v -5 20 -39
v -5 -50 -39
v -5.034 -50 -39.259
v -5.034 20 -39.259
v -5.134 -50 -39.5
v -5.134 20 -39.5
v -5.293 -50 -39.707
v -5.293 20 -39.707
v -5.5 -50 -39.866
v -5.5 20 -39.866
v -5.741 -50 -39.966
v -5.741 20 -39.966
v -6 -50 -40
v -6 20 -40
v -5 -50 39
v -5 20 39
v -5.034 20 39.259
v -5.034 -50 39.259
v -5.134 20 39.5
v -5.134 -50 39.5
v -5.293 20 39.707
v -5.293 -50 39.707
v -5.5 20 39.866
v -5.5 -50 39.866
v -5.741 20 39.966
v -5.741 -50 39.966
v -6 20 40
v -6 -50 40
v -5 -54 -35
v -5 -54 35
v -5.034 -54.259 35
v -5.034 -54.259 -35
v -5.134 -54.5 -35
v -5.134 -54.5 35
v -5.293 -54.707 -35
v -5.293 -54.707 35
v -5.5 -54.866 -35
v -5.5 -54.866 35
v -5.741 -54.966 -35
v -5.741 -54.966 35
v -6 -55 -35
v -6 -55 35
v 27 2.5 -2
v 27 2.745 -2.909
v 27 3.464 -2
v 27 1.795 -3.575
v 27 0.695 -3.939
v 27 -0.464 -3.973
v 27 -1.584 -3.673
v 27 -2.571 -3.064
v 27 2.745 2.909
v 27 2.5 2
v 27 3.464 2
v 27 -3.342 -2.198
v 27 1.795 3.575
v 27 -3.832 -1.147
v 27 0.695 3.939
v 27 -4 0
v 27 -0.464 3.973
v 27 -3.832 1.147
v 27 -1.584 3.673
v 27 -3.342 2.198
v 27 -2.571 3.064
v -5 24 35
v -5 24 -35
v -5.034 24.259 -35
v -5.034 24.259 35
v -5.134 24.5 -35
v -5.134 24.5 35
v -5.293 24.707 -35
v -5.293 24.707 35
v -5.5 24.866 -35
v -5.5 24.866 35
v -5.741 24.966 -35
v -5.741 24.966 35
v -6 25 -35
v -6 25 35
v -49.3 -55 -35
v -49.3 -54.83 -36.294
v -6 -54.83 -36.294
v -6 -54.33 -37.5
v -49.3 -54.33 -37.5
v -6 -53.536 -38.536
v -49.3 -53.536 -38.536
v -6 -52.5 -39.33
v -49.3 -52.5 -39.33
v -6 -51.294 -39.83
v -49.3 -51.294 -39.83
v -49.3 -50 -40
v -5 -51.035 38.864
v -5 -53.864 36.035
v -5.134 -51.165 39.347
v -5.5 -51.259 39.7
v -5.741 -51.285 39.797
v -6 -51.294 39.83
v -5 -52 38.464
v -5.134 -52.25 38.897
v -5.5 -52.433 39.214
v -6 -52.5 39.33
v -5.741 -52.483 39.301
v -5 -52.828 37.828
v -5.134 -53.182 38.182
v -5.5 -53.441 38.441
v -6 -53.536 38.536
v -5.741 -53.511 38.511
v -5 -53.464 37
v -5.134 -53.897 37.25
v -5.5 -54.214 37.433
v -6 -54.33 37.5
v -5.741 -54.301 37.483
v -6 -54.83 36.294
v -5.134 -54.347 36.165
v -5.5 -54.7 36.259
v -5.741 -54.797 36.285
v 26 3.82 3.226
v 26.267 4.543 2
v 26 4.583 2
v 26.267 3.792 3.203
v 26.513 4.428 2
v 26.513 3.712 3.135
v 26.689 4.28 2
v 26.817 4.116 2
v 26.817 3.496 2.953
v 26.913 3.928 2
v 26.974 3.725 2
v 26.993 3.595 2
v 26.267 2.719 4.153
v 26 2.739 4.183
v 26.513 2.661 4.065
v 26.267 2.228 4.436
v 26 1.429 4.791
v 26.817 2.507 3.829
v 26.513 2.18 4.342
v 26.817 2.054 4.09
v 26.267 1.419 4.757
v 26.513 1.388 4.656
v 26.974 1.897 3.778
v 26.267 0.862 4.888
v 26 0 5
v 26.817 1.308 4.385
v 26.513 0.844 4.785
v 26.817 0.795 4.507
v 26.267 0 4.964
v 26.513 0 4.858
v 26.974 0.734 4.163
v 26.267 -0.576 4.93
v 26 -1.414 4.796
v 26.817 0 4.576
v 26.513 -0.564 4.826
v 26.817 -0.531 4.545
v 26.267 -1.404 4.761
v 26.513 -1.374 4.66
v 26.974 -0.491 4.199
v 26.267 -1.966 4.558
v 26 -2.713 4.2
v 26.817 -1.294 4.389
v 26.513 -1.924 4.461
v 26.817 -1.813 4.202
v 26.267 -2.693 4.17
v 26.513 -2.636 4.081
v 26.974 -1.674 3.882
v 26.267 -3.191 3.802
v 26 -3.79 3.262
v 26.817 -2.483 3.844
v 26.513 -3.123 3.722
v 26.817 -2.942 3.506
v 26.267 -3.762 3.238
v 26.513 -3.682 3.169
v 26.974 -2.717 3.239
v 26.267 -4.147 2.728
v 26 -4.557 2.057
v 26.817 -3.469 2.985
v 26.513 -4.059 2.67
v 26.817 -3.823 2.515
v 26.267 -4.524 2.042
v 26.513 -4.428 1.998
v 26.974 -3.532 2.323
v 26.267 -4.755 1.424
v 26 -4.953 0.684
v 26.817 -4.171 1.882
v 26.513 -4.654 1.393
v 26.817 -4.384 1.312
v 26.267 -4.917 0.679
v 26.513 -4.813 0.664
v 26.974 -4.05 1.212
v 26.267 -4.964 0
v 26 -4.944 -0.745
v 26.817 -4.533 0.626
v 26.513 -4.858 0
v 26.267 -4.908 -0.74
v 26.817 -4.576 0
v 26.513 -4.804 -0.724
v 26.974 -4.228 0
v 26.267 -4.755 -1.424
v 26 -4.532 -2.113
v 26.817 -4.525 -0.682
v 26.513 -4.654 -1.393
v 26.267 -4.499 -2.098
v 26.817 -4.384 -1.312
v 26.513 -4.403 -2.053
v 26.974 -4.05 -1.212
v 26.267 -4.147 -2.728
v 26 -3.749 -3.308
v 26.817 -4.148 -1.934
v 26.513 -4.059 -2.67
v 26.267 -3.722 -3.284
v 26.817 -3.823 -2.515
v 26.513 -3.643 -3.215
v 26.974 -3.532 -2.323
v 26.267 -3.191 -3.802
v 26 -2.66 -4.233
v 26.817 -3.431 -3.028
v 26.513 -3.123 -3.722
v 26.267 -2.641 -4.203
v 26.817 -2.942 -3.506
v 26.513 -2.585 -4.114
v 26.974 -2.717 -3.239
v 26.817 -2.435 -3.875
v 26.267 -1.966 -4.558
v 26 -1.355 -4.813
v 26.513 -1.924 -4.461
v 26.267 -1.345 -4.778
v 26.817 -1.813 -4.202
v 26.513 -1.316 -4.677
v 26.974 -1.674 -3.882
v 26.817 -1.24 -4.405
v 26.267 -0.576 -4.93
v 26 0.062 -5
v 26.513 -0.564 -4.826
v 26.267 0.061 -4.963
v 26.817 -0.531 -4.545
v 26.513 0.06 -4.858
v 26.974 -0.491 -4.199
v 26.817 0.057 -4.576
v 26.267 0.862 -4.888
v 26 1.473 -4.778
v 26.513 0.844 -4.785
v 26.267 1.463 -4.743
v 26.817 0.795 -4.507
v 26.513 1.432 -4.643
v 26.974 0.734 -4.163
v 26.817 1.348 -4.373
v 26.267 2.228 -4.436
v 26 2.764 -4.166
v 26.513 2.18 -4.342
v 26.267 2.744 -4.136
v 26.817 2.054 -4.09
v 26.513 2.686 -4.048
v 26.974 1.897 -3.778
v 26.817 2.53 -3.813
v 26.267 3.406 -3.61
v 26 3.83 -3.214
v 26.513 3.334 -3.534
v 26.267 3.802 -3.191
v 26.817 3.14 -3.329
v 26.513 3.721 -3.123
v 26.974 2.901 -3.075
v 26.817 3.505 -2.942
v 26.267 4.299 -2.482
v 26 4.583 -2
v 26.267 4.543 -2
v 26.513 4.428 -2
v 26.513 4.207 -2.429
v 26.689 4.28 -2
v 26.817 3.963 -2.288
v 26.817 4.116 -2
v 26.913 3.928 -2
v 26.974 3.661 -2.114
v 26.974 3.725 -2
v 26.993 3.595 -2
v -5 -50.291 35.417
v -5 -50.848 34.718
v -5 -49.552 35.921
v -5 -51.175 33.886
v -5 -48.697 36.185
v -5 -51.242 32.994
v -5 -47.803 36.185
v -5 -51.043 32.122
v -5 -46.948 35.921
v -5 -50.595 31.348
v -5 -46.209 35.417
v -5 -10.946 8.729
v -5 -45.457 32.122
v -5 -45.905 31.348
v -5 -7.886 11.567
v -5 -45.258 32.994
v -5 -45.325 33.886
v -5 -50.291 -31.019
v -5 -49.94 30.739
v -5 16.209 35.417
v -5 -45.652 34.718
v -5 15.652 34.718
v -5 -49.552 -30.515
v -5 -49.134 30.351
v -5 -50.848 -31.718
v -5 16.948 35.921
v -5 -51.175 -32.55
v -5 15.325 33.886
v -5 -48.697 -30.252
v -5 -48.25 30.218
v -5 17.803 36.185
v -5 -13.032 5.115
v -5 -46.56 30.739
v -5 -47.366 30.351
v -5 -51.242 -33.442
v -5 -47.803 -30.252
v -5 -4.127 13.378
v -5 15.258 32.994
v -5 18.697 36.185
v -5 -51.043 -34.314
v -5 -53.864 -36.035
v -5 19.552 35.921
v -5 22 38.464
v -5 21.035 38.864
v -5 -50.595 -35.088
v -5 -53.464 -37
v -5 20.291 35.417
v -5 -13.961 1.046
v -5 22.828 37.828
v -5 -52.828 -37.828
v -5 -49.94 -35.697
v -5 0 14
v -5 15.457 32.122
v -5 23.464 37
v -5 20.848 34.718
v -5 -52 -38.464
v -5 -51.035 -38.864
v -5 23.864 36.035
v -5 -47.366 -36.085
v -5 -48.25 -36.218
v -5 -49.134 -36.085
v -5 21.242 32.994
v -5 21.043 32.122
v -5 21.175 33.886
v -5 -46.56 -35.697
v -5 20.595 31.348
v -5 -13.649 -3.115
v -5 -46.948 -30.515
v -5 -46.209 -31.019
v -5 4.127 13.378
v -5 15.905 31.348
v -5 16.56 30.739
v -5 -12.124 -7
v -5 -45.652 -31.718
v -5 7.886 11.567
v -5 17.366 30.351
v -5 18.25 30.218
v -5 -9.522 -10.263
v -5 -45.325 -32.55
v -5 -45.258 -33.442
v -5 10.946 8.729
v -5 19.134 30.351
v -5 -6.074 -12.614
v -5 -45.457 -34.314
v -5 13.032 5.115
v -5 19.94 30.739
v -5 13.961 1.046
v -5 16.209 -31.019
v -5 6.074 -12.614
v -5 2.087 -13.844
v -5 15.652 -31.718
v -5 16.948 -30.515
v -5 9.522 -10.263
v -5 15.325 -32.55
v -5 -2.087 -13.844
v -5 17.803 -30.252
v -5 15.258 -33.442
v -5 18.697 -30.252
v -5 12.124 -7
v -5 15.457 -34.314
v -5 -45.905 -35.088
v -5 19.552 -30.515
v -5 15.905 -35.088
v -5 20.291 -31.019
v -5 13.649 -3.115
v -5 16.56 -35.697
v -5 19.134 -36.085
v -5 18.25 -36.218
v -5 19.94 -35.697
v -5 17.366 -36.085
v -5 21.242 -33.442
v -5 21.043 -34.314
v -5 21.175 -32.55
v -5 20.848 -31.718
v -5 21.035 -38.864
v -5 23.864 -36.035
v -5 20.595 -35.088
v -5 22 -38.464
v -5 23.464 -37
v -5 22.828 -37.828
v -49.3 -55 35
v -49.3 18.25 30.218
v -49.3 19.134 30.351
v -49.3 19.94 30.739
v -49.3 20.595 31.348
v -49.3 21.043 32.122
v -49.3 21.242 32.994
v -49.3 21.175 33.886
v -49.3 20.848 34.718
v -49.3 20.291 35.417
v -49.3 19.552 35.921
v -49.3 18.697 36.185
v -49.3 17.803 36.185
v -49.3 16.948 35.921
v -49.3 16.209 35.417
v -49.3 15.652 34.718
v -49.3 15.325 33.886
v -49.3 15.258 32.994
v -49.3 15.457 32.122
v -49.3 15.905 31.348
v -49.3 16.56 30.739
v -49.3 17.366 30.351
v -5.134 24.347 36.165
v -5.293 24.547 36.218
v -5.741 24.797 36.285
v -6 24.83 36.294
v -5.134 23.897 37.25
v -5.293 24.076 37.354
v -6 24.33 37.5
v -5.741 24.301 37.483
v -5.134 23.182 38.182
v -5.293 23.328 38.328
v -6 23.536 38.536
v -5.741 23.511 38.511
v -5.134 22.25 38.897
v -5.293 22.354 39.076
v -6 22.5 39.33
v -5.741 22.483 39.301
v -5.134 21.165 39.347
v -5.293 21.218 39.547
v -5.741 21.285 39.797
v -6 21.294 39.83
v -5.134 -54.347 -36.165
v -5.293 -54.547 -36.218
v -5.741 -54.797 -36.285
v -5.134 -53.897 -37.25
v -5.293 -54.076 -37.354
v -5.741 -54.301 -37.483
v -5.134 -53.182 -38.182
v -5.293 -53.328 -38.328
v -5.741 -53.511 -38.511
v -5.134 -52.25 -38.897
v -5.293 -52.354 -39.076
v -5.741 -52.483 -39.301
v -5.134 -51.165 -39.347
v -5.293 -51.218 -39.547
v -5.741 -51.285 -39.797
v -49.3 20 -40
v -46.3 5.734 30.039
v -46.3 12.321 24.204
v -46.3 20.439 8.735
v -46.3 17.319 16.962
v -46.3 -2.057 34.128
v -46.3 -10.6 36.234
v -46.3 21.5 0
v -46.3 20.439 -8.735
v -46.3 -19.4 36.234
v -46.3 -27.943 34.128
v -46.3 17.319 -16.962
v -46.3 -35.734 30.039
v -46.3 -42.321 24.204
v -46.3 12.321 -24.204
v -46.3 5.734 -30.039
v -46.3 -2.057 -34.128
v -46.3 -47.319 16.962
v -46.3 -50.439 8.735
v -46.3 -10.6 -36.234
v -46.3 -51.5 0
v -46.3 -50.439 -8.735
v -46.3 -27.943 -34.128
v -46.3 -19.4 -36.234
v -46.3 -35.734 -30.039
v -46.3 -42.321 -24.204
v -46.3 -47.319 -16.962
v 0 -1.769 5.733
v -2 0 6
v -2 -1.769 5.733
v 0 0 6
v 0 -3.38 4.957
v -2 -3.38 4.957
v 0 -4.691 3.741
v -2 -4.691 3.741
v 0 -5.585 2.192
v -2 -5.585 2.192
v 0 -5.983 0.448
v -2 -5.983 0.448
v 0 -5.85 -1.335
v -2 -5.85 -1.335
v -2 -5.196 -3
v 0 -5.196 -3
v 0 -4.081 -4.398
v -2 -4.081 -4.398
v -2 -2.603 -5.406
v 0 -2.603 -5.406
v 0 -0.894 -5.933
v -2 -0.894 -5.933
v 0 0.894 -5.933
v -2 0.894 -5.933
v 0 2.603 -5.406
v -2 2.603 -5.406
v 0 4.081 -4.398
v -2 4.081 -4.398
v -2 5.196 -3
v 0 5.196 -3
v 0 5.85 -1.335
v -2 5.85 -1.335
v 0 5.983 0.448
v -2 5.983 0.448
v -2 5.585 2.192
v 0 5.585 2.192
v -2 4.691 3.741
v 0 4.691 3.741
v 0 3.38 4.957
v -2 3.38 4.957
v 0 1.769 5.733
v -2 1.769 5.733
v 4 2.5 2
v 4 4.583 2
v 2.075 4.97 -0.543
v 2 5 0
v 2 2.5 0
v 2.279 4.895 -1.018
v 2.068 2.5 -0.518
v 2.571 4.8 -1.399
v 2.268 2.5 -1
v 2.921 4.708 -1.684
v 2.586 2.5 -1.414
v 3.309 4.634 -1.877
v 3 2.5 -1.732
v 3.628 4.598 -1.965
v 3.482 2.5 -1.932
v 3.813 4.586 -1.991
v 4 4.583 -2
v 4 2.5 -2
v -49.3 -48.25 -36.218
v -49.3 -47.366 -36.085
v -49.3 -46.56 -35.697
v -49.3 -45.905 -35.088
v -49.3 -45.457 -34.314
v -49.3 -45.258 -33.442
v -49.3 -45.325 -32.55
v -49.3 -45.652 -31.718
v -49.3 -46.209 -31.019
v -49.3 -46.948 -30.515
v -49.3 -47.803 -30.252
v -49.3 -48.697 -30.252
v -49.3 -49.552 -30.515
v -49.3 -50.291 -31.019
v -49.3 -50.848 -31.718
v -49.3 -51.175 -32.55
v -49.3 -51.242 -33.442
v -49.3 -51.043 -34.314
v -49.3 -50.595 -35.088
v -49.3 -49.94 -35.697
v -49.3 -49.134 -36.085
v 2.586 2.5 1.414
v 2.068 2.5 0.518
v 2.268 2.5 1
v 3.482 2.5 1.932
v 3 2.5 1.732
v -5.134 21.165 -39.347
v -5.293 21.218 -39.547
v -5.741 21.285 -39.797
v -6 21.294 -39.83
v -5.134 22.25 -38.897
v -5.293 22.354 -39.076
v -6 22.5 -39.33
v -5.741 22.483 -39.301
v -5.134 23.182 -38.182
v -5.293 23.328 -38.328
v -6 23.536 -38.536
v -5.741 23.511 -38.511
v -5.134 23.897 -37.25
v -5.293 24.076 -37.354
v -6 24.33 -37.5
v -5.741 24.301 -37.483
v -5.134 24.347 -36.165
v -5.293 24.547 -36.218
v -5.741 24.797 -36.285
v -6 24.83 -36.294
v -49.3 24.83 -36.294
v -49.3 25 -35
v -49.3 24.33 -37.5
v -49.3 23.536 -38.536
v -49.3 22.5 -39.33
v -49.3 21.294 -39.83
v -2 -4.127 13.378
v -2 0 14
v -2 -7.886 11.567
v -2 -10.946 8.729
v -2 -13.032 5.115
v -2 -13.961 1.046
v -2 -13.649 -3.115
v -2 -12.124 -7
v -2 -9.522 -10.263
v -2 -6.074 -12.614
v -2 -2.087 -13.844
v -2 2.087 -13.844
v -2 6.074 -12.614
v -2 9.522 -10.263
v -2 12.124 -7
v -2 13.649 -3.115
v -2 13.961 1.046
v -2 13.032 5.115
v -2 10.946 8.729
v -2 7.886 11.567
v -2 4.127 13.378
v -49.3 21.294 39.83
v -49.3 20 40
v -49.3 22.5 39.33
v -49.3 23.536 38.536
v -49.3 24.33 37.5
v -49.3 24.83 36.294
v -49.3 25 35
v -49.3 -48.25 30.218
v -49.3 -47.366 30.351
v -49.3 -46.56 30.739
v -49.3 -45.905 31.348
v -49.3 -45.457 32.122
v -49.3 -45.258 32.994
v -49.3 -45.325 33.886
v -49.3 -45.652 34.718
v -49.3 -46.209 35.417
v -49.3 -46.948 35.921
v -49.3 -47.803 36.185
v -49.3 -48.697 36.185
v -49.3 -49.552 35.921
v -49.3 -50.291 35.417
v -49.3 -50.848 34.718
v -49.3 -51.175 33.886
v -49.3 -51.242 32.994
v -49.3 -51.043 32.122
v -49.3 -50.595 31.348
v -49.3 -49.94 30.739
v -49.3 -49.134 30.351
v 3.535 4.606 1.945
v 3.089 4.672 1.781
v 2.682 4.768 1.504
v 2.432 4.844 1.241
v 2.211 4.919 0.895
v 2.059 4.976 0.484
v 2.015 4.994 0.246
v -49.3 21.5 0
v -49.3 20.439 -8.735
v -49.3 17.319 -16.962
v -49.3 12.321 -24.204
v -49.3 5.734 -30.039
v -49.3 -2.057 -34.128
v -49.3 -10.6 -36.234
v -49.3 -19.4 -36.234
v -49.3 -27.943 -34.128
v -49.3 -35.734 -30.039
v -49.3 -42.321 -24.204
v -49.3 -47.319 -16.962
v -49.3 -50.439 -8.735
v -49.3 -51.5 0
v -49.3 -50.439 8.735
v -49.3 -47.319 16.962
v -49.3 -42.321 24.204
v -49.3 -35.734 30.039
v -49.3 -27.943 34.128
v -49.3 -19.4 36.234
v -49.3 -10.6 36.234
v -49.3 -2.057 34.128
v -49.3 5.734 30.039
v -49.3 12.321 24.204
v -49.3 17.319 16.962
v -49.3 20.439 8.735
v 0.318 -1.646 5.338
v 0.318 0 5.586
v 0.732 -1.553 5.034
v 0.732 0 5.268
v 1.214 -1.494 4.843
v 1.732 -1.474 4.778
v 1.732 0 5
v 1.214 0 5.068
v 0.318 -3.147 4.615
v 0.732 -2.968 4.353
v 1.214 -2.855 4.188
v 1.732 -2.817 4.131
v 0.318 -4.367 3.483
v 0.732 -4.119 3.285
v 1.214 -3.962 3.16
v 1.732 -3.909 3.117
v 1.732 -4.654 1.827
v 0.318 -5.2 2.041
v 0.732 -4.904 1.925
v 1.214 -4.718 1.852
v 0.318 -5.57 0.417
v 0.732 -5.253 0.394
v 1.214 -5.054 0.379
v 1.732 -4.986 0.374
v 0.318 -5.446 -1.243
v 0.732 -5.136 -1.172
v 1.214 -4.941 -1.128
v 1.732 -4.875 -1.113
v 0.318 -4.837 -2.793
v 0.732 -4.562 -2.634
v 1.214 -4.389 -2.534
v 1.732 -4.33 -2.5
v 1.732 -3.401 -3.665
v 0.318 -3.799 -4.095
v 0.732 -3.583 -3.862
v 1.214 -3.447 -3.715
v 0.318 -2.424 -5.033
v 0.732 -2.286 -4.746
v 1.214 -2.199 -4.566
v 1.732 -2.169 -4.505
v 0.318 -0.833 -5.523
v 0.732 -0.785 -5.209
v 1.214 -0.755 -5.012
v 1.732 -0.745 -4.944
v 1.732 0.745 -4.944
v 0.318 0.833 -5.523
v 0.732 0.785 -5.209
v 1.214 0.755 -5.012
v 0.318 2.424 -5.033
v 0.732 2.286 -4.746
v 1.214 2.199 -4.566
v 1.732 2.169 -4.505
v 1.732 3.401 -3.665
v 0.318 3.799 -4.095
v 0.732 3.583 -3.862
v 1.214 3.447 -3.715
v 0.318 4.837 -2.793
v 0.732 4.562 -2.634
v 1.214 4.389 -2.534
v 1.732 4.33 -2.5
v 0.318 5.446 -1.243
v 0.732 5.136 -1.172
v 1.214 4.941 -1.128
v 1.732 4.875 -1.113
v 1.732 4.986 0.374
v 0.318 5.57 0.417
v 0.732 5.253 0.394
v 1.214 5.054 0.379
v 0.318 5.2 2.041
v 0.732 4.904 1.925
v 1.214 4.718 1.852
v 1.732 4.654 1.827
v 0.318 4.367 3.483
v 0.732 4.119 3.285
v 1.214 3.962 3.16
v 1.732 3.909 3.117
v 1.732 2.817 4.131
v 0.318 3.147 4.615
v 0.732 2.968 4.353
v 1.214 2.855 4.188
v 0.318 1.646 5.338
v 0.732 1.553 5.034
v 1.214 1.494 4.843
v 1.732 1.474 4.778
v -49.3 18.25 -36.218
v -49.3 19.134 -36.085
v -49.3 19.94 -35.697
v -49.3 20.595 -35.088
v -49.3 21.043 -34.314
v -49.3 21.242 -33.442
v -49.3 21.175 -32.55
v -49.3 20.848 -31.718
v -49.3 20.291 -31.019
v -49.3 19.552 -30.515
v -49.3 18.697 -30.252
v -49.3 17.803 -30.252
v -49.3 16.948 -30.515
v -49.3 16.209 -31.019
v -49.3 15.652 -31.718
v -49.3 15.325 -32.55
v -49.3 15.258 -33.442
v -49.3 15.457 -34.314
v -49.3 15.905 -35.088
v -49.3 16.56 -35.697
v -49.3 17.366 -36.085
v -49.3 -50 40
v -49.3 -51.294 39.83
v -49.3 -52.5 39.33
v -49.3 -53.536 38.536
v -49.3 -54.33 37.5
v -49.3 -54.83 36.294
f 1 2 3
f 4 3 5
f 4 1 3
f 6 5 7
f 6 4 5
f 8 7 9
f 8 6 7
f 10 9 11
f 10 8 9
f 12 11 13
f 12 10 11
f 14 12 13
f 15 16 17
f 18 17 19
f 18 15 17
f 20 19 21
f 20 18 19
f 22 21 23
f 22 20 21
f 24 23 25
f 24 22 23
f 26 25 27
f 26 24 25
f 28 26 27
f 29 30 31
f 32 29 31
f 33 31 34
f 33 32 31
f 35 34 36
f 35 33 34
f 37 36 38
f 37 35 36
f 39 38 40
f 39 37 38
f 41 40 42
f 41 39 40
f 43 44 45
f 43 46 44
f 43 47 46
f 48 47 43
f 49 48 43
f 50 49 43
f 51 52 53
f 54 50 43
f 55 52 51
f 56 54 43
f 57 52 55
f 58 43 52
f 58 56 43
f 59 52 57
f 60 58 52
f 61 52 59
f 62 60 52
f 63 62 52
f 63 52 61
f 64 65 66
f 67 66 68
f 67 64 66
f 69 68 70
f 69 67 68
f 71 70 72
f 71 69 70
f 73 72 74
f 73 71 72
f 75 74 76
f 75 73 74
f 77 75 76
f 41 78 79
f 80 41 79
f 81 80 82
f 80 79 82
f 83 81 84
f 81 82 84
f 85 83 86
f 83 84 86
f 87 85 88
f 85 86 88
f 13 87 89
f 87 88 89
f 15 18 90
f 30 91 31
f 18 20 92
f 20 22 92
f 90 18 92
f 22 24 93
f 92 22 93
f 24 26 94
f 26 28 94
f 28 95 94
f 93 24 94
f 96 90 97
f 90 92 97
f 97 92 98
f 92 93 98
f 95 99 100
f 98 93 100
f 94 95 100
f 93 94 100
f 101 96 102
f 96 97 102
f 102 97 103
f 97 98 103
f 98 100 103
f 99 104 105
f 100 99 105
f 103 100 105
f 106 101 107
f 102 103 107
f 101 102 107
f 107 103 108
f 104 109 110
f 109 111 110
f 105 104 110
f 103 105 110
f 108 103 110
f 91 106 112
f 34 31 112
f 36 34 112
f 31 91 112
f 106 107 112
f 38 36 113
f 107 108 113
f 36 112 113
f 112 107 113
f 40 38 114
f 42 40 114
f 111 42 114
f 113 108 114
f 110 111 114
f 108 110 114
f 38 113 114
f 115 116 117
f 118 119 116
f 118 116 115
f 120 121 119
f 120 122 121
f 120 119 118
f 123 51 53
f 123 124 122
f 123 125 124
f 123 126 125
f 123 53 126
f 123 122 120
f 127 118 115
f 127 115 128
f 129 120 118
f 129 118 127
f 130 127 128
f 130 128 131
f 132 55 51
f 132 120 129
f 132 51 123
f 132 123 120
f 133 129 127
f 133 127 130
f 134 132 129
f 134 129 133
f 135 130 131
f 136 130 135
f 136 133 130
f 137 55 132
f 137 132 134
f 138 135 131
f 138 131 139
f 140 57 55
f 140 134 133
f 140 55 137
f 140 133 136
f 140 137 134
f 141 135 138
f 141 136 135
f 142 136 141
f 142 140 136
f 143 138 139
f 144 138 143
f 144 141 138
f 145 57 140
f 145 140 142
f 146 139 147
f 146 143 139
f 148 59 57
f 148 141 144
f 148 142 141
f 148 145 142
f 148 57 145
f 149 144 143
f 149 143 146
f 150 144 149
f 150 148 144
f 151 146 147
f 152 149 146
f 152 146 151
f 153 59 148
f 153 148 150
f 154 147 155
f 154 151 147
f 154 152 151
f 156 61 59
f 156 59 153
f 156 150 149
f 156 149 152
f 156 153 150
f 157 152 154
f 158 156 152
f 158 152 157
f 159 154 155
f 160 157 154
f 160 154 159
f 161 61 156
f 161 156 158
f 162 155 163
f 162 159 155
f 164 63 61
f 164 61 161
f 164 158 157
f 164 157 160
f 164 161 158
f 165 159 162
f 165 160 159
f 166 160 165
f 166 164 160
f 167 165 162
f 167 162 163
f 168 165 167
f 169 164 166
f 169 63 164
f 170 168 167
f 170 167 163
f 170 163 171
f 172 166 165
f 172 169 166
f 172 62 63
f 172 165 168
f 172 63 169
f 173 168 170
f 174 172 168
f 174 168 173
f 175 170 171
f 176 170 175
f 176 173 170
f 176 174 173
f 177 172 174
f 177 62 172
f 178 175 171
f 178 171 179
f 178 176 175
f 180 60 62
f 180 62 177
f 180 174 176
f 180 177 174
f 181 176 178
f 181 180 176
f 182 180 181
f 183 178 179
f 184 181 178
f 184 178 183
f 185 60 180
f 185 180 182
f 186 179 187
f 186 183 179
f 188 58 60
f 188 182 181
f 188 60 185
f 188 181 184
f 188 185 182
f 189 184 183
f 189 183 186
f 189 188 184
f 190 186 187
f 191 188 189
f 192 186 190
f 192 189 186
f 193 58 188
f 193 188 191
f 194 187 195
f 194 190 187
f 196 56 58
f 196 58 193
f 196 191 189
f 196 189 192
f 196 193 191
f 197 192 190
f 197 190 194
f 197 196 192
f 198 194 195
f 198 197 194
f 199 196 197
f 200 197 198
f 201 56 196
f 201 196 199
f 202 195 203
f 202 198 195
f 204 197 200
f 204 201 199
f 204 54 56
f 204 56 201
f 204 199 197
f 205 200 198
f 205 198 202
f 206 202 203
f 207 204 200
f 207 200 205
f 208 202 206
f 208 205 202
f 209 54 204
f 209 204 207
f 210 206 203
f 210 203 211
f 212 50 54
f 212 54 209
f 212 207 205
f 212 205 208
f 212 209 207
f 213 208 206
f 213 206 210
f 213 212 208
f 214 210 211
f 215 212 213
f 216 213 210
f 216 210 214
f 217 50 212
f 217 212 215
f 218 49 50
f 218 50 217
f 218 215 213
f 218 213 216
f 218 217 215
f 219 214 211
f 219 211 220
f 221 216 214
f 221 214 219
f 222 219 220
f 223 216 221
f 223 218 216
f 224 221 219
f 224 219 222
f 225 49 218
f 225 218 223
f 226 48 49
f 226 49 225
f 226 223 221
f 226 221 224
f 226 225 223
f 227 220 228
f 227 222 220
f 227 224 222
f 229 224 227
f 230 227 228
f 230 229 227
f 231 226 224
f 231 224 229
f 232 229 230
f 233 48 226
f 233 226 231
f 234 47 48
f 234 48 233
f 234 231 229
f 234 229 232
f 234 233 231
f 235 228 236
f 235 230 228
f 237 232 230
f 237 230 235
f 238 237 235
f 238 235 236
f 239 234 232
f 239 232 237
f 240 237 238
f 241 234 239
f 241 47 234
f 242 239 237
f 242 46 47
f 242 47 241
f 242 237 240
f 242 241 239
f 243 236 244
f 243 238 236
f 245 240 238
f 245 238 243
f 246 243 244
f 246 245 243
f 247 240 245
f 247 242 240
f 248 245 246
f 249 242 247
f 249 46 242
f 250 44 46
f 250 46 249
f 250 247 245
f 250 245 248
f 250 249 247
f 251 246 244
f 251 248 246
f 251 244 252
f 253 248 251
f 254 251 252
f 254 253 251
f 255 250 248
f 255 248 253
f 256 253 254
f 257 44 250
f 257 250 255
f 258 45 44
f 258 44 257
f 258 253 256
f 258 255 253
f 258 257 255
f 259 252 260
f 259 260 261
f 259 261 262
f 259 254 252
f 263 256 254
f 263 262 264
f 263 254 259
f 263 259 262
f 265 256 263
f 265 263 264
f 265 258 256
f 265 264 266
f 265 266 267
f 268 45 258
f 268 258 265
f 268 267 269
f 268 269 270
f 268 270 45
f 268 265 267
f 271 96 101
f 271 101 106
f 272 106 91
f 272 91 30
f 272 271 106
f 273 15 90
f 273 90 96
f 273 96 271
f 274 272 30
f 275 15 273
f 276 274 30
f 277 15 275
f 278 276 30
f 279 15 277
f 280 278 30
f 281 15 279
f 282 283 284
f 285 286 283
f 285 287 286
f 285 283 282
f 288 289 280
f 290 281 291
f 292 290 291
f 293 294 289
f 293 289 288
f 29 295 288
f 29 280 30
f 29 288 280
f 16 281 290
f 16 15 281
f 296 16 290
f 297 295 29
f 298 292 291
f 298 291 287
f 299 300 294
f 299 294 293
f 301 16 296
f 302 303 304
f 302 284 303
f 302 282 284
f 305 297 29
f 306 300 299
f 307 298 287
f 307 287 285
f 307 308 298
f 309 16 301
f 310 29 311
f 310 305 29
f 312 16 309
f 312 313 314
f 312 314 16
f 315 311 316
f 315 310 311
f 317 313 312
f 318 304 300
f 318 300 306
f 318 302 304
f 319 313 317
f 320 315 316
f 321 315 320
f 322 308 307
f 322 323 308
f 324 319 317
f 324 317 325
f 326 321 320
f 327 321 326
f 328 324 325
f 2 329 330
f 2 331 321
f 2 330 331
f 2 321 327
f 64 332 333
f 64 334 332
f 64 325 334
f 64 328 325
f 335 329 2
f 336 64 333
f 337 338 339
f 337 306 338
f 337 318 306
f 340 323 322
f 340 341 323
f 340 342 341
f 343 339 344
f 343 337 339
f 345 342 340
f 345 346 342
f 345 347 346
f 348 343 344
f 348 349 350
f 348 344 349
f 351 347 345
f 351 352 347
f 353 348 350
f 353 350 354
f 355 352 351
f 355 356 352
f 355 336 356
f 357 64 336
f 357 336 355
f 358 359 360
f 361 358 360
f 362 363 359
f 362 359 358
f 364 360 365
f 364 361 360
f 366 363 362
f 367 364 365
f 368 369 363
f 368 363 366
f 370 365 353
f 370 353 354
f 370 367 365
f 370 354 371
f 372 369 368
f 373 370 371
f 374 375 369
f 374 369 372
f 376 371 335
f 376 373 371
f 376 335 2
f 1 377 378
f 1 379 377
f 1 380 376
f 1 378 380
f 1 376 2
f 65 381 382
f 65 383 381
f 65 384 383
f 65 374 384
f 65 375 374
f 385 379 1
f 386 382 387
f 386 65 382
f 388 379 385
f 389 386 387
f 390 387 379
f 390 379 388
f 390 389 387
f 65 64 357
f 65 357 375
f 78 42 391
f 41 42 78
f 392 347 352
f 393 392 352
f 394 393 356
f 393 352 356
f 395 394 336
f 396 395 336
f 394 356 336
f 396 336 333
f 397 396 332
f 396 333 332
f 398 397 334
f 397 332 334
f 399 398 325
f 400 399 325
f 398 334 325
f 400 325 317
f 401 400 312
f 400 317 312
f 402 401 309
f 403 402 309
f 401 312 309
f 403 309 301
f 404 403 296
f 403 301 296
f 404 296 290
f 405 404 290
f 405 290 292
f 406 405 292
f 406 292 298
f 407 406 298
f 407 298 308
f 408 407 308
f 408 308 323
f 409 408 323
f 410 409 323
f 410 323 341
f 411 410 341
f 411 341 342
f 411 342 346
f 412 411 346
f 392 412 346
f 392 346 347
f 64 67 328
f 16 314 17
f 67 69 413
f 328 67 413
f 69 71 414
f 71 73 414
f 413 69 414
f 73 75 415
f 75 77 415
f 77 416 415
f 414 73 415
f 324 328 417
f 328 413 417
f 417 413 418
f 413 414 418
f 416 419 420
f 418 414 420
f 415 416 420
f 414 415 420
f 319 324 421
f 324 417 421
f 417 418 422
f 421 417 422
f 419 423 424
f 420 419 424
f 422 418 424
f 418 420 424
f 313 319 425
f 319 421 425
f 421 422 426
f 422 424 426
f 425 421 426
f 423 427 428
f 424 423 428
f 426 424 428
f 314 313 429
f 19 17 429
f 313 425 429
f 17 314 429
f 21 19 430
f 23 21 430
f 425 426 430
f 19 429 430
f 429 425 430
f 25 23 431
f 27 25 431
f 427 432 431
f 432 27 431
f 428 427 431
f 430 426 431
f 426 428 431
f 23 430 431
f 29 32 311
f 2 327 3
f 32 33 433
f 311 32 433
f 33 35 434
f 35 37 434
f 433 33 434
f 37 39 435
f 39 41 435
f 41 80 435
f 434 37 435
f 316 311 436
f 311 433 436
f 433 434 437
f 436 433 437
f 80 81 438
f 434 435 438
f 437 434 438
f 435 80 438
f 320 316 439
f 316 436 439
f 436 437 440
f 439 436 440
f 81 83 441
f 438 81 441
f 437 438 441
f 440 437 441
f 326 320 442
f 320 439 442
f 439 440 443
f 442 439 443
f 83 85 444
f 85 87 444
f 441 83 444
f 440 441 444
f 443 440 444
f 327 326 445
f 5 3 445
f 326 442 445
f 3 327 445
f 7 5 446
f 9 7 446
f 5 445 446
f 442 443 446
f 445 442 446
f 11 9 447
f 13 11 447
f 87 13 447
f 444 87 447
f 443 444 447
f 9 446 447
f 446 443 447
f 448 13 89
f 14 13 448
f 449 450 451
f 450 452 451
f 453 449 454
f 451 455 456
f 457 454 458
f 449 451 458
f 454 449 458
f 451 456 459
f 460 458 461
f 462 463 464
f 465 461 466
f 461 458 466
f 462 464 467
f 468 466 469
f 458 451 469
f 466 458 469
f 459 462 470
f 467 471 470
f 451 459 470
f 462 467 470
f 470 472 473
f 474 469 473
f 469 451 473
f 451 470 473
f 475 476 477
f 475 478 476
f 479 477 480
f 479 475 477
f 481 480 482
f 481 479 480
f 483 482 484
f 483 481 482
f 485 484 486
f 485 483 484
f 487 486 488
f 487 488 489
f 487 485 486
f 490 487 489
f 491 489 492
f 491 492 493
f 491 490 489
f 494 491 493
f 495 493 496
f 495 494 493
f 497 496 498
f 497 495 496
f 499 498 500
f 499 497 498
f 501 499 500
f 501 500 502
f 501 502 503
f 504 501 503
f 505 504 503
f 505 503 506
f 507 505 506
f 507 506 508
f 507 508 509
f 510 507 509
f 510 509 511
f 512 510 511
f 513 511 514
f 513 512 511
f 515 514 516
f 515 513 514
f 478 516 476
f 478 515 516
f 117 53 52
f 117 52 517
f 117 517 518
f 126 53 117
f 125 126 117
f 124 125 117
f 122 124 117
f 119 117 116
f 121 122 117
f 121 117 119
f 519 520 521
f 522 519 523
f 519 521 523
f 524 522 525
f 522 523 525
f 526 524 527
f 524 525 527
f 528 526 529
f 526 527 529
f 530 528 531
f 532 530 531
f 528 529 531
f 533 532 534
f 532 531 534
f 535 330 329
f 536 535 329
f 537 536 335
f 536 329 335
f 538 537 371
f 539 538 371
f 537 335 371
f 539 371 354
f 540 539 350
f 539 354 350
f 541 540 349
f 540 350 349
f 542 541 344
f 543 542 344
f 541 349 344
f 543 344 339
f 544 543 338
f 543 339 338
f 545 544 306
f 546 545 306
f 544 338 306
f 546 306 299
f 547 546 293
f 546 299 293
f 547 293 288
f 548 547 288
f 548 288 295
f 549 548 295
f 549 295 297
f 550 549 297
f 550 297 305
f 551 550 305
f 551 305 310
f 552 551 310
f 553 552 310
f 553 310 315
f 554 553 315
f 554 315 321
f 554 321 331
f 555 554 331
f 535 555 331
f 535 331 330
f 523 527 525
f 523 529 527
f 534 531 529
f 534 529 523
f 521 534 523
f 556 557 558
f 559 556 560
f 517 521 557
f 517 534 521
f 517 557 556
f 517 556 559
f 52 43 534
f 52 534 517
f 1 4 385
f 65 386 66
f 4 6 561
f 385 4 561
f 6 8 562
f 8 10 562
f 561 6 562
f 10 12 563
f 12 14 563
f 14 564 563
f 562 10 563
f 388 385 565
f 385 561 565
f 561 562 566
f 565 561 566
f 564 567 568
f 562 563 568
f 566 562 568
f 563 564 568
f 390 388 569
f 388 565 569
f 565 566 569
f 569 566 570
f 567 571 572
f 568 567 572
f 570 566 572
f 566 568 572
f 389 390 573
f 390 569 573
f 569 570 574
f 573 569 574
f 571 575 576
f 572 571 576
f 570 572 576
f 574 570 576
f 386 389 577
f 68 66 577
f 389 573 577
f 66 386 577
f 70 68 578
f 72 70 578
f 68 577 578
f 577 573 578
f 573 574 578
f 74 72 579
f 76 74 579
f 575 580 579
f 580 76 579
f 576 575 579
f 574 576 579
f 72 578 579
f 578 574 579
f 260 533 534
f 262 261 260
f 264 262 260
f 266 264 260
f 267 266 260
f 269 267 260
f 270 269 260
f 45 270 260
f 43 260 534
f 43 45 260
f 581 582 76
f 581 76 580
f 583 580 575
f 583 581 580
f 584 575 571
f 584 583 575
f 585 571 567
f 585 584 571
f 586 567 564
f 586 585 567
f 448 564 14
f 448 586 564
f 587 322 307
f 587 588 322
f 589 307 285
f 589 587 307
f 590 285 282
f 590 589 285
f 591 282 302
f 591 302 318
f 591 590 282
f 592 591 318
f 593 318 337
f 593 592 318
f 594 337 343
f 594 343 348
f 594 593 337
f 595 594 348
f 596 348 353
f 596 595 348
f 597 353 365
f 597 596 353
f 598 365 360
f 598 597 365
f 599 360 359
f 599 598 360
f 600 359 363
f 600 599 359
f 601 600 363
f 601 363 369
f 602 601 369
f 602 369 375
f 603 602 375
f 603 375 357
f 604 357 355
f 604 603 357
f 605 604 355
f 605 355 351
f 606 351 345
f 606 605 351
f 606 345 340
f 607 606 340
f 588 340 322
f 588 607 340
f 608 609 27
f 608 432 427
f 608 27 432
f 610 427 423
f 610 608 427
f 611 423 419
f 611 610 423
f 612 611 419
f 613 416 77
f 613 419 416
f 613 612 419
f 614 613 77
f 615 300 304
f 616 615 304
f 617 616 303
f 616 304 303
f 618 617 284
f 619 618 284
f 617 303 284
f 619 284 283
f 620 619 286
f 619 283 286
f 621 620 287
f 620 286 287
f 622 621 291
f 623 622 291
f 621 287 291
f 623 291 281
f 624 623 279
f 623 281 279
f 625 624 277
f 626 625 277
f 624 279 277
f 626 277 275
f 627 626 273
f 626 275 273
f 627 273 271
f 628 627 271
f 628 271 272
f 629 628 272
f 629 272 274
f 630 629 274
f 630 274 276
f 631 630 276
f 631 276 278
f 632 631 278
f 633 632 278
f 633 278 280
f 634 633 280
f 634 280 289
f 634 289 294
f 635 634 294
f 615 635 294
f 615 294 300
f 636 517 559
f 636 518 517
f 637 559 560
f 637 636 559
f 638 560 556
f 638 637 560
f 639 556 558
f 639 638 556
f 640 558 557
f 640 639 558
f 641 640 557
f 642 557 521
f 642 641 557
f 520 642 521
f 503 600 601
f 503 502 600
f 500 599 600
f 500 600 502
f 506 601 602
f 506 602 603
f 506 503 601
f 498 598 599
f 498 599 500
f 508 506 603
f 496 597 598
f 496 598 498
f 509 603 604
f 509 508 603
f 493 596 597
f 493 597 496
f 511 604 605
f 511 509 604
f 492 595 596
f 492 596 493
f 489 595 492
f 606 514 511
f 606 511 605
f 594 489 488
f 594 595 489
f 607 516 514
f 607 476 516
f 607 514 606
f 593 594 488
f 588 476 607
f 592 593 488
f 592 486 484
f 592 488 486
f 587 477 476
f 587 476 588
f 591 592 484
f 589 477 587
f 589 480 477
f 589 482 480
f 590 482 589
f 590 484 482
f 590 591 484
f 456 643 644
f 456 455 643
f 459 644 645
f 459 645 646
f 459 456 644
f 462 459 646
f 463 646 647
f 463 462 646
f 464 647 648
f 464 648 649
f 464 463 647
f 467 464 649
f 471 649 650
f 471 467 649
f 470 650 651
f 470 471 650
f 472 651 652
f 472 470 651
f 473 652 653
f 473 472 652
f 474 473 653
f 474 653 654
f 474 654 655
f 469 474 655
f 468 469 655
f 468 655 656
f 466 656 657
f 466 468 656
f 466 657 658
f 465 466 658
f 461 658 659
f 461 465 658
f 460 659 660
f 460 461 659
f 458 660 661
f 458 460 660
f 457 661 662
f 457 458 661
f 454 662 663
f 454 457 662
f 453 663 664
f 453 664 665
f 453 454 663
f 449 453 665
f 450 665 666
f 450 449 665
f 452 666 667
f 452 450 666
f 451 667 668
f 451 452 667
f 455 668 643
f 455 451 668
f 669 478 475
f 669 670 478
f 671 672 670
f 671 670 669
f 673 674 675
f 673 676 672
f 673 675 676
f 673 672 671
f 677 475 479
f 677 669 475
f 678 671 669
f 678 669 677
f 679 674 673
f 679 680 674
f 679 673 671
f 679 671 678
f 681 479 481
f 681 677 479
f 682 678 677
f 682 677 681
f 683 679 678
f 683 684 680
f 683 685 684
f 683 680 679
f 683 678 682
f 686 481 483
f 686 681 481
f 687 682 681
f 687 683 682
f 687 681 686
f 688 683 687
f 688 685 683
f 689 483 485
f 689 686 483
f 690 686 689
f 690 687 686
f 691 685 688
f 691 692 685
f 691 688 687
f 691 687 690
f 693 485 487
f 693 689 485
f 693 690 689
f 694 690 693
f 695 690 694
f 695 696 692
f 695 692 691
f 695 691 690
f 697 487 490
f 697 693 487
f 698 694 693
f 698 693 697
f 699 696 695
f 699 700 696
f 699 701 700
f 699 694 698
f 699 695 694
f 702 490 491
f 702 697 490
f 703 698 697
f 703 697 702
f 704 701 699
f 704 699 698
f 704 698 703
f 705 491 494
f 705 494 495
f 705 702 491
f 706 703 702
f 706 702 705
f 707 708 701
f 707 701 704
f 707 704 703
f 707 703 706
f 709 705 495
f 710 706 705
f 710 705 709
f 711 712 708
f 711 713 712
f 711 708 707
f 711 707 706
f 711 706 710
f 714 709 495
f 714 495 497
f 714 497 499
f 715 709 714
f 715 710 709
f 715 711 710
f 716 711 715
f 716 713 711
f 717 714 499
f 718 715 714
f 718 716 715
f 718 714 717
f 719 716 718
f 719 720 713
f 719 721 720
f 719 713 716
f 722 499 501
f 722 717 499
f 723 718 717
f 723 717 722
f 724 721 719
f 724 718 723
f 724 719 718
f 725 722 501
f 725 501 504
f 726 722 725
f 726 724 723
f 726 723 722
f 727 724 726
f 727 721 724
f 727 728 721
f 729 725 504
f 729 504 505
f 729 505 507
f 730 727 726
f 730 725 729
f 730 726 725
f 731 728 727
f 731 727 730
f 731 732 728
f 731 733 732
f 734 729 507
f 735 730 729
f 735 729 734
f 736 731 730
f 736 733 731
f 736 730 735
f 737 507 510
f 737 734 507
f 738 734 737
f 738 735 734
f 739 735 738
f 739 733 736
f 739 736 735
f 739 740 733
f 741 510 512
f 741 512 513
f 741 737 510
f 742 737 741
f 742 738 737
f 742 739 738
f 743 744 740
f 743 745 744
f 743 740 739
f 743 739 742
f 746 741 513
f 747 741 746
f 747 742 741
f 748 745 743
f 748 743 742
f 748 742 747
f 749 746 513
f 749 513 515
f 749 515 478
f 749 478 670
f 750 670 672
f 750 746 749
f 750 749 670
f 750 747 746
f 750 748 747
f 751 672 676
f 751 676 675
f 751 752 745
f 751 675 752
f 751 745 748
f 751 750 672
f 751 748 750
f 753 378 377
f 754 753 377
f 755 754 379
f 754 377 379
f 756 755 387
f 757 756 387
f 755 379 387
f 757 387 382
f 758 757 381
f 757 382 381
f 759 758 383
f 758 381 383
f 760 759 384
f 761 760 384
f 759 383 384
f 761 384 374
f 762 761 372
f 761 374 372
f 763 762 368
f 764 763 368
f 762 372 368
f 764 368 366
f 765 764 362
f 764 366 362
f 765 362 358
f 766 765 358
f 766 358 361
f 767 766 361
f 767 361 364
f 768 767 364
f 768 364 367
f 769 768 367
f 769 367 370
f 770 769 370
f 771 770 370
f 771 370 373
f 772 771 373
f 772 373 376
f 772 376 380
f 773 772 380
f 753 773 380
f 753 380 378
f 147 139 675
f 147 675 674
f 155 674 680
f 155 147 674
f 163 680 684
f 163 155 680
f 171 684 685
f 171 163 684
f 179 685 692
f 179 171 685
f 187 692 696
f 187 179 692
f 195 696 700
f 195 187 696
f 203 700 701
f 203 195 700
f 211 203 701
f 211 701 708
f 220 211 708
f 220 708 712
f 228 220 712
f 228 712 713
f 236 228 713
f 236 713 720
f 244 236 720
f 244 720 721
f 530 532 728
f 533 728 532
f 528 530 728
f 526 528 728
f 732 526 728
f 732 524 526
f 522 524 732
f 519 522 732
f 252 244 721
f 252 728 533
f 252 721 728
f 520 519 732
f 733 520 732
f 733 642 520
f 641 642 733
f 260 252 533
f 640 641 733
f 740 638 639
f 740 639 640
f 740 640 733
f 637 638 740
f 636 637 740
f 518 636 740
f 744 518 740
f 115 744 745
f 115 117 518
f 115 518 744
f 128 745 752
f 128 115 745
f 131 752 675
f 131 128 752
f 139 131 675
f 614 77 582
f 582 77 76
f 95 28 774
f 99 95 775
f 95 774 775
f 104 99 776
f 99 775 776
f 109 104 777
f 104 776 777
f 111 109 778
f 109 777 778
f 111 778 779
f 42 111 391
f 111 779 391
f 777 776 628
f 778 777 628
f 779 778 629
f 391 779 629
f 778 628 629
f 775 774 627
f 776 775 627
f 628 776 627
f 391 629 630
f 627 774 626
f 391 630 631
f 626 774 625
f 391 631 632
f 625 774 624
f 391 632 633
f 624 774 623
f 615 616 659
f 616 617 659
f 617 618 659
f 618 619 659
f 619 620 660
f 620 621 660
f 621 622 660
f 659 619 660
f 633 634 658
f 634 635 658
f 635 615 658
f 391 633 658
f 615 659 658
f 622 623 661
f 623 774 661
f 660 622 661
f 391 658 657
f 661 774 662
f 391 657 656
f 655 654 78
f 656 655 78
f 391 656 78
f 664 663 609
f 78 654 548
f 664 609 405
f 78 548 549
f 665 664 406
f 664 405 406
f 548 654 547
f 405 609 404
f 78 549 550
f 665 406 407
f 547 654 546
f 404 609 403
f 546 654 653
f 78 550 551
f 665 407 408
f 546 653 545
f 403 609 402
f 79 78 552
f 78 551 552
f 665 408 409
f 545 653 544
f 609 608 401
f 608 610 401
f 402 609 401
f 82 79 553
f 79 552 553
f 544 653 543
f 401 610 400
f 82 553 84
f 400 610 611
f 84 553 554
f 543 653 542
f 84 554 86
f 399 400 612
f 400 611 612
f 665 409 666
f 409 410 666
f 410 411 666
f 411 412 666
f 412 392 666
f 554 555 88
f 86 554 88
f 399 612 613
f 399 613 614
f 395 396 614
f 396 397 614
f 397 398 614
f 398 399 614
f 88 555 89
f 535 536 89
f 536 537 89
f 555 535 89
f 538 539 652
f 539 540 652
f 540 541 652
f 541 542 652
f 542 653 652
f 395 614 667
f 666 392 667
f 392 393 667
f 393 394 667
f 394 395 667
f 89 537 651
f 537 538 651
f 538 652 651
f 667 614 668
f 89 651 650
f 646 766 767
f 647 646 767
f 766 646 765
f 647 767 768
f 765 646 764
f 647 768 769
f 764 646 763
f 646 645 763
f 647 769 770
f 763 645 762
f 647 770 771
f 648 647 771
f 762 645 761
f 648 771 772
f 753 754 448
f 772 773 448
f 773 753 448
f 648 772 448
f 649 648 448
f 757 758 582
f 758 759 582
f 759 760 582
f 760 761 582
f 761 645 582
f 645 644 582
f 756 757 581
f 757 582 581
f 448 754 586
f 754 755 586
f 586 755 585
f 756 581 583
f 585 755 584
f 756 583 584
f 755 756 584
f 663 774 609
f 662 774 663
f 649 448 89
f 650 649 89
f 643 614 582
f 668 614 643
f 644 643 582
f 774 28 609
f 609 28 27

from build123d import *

# Parameters (mm, degrees)
SKETCH1_W           = 80
SKETCH1_H           = 80
BOSS_EXTRUDE1_DEPTH = 44.3
SKETCH2_R           = 3
CUT_EXTRUDE1_DEPTH  = 82.1633538
FILLET1_R           = 5
FILLET2_R           = 1
FILLET3_R           = 1
CUT_EXTRUDE2_DEPTH  = 25
FILLET4_R           = 2
SKETCH5_W           = 3
SKETCH5_H           = 36.5


with BuildPart() as part:
    # Sketch1 → Boss-Extrude1 (new body)
    with BuildSketch(Plane(origin=(-5, 0, 0), x_dir=(0, 0, -1), z_dir=(1, 0, 0))):
        with Locations((0, -15)):
            Rectangle(SKETCH1_W, SKETCH1_H)
    extrude(amount=-BOSS_EXTRUDE1_DEPTH)

    # Sketch2 → Cut-Extrude1 (cut, through all)
    with BuildSketch(Plane(origin=(-5, 0, 0), x_dir=(0, 0, -1), z_dir=(1, 0, 0))):
        with Locations((-33.218029743, 18.25)):
            Circle(SKETCH2_R)
        with Locations((33.218029743, 18.25)):
            Circle(SKETCH2_R)
        with Locations((33.218029743, -48.25)):
            Circle(SKETCH2_R)
        with Locations((-33.218029743, -48.25)):
            Circle(SKETCH2_R)
    extrude(amount=-CUT_EXTRUDE1_DEPTH, mode=Mode.SUBTRACT)

    # Fillet1
    fillet1_edges = [part.edges().sort_by_distance(p)[0] for p in [
        (-27.15, 25, 40),
        (-27.15, 25, -40),
        (-27.15, -55, -40),
        (-27.15, -55, 40),
    ]]
    fillet(fillet1_edges, radius=FILLET1_R)

    # Fillet2
    fillet2_edges = [part.edges().sort_by_distance(p)[0] for p in [
        (-5, -55, 0),
        (-5, -15, 40),
        (-5, -15, -40),
        (-5, 25, 0),
        (-5, 23.535533906, -38.535533906),
        (-5, 23.535533906, 38.535533906),
        (-5, -53.535533906, 38.535533906),
        (-5, -53.535533906, -38.535533906),
    ]]
    fillet(fillet2_edges, radius=FILLET2_R)

    # Sketch3 → Revolve1 (revolve)
    with BuildSketch(Plane.XY, mode=Mode.PRIVATE) as revolve1_sk:
        with BuildLine():
            Line((-5, 14), (-2, 14))
            Line((-2, 14), (-2, 6))
            Line((-2, 6), (0, 6))
            ThreePointArc((0, 6), (0.732050808, 5.267949192), (1.732050808, 5))
            Line((1.732050808, 5), (27, 5))
            Line((27, 5), (27, 0))
            Line((27, 0), (-5, 0))
            Line((-5, 0), (-5, 14))
        make_face()
    revolve(revolve1_sk.sketch.rotate(Axis((-5, 0, 0), (1, 0, 0)), 90), axis=Axis((-5, 0, 0), (1, 0, 0)))

    # Fillet3
    fillet3_edges = [part.edges().sort_by_distance(p)[0] for p in [
        (27, 0, -5),
    ]]
    fillet(fillet3_edges, radius=FILLET3_R)

    # Sketch4 → Cut-Extrude2 (cut)
    with BuildSketch(Plane(origin=(27, 0, 0), x_dir=(0, 0, -1), z_dir=(1, 0, 0))):
        with BuildLine():
            Line((2, 4.582575695), (2, 2.5))
            Line((2, 2.5), (-2, 2.5))
            Line((-2, 2.5), (-2, 4.582575695))
            ThreePointArc((-2, 4.582575695), (0, 5), (2, 4.582575695))
        make_face()
    extrude(amount=-CUT_EXTRUDE2_DEPTH, mode=Mode.SUBTRACT)

    # Fillet4
    fillet4_edges = [part.edges().sort_by_distance(p)[0] for p in [
        (2, 3.541287847, -2),
        (2, 3.541287847, 2),
    ]]
    fillet(fillet4_edges, radius=FILLET4_R - 0.0001)  # a hair under: the kernel refuses the full size

    # Sketch5 → Cut-Revolve1 (revolve, cut)
    with BuildSketch(Plane.XY):
        with Locations((-47.8, 3.25)):
            Rectangle(SKETCH5_W, SKETCH5_H)
    revolve(axis=Axis((-46.3, -15, 0), (-1, 0, 0)), mode=Mode.SUBTRACT)


solid = part.part
